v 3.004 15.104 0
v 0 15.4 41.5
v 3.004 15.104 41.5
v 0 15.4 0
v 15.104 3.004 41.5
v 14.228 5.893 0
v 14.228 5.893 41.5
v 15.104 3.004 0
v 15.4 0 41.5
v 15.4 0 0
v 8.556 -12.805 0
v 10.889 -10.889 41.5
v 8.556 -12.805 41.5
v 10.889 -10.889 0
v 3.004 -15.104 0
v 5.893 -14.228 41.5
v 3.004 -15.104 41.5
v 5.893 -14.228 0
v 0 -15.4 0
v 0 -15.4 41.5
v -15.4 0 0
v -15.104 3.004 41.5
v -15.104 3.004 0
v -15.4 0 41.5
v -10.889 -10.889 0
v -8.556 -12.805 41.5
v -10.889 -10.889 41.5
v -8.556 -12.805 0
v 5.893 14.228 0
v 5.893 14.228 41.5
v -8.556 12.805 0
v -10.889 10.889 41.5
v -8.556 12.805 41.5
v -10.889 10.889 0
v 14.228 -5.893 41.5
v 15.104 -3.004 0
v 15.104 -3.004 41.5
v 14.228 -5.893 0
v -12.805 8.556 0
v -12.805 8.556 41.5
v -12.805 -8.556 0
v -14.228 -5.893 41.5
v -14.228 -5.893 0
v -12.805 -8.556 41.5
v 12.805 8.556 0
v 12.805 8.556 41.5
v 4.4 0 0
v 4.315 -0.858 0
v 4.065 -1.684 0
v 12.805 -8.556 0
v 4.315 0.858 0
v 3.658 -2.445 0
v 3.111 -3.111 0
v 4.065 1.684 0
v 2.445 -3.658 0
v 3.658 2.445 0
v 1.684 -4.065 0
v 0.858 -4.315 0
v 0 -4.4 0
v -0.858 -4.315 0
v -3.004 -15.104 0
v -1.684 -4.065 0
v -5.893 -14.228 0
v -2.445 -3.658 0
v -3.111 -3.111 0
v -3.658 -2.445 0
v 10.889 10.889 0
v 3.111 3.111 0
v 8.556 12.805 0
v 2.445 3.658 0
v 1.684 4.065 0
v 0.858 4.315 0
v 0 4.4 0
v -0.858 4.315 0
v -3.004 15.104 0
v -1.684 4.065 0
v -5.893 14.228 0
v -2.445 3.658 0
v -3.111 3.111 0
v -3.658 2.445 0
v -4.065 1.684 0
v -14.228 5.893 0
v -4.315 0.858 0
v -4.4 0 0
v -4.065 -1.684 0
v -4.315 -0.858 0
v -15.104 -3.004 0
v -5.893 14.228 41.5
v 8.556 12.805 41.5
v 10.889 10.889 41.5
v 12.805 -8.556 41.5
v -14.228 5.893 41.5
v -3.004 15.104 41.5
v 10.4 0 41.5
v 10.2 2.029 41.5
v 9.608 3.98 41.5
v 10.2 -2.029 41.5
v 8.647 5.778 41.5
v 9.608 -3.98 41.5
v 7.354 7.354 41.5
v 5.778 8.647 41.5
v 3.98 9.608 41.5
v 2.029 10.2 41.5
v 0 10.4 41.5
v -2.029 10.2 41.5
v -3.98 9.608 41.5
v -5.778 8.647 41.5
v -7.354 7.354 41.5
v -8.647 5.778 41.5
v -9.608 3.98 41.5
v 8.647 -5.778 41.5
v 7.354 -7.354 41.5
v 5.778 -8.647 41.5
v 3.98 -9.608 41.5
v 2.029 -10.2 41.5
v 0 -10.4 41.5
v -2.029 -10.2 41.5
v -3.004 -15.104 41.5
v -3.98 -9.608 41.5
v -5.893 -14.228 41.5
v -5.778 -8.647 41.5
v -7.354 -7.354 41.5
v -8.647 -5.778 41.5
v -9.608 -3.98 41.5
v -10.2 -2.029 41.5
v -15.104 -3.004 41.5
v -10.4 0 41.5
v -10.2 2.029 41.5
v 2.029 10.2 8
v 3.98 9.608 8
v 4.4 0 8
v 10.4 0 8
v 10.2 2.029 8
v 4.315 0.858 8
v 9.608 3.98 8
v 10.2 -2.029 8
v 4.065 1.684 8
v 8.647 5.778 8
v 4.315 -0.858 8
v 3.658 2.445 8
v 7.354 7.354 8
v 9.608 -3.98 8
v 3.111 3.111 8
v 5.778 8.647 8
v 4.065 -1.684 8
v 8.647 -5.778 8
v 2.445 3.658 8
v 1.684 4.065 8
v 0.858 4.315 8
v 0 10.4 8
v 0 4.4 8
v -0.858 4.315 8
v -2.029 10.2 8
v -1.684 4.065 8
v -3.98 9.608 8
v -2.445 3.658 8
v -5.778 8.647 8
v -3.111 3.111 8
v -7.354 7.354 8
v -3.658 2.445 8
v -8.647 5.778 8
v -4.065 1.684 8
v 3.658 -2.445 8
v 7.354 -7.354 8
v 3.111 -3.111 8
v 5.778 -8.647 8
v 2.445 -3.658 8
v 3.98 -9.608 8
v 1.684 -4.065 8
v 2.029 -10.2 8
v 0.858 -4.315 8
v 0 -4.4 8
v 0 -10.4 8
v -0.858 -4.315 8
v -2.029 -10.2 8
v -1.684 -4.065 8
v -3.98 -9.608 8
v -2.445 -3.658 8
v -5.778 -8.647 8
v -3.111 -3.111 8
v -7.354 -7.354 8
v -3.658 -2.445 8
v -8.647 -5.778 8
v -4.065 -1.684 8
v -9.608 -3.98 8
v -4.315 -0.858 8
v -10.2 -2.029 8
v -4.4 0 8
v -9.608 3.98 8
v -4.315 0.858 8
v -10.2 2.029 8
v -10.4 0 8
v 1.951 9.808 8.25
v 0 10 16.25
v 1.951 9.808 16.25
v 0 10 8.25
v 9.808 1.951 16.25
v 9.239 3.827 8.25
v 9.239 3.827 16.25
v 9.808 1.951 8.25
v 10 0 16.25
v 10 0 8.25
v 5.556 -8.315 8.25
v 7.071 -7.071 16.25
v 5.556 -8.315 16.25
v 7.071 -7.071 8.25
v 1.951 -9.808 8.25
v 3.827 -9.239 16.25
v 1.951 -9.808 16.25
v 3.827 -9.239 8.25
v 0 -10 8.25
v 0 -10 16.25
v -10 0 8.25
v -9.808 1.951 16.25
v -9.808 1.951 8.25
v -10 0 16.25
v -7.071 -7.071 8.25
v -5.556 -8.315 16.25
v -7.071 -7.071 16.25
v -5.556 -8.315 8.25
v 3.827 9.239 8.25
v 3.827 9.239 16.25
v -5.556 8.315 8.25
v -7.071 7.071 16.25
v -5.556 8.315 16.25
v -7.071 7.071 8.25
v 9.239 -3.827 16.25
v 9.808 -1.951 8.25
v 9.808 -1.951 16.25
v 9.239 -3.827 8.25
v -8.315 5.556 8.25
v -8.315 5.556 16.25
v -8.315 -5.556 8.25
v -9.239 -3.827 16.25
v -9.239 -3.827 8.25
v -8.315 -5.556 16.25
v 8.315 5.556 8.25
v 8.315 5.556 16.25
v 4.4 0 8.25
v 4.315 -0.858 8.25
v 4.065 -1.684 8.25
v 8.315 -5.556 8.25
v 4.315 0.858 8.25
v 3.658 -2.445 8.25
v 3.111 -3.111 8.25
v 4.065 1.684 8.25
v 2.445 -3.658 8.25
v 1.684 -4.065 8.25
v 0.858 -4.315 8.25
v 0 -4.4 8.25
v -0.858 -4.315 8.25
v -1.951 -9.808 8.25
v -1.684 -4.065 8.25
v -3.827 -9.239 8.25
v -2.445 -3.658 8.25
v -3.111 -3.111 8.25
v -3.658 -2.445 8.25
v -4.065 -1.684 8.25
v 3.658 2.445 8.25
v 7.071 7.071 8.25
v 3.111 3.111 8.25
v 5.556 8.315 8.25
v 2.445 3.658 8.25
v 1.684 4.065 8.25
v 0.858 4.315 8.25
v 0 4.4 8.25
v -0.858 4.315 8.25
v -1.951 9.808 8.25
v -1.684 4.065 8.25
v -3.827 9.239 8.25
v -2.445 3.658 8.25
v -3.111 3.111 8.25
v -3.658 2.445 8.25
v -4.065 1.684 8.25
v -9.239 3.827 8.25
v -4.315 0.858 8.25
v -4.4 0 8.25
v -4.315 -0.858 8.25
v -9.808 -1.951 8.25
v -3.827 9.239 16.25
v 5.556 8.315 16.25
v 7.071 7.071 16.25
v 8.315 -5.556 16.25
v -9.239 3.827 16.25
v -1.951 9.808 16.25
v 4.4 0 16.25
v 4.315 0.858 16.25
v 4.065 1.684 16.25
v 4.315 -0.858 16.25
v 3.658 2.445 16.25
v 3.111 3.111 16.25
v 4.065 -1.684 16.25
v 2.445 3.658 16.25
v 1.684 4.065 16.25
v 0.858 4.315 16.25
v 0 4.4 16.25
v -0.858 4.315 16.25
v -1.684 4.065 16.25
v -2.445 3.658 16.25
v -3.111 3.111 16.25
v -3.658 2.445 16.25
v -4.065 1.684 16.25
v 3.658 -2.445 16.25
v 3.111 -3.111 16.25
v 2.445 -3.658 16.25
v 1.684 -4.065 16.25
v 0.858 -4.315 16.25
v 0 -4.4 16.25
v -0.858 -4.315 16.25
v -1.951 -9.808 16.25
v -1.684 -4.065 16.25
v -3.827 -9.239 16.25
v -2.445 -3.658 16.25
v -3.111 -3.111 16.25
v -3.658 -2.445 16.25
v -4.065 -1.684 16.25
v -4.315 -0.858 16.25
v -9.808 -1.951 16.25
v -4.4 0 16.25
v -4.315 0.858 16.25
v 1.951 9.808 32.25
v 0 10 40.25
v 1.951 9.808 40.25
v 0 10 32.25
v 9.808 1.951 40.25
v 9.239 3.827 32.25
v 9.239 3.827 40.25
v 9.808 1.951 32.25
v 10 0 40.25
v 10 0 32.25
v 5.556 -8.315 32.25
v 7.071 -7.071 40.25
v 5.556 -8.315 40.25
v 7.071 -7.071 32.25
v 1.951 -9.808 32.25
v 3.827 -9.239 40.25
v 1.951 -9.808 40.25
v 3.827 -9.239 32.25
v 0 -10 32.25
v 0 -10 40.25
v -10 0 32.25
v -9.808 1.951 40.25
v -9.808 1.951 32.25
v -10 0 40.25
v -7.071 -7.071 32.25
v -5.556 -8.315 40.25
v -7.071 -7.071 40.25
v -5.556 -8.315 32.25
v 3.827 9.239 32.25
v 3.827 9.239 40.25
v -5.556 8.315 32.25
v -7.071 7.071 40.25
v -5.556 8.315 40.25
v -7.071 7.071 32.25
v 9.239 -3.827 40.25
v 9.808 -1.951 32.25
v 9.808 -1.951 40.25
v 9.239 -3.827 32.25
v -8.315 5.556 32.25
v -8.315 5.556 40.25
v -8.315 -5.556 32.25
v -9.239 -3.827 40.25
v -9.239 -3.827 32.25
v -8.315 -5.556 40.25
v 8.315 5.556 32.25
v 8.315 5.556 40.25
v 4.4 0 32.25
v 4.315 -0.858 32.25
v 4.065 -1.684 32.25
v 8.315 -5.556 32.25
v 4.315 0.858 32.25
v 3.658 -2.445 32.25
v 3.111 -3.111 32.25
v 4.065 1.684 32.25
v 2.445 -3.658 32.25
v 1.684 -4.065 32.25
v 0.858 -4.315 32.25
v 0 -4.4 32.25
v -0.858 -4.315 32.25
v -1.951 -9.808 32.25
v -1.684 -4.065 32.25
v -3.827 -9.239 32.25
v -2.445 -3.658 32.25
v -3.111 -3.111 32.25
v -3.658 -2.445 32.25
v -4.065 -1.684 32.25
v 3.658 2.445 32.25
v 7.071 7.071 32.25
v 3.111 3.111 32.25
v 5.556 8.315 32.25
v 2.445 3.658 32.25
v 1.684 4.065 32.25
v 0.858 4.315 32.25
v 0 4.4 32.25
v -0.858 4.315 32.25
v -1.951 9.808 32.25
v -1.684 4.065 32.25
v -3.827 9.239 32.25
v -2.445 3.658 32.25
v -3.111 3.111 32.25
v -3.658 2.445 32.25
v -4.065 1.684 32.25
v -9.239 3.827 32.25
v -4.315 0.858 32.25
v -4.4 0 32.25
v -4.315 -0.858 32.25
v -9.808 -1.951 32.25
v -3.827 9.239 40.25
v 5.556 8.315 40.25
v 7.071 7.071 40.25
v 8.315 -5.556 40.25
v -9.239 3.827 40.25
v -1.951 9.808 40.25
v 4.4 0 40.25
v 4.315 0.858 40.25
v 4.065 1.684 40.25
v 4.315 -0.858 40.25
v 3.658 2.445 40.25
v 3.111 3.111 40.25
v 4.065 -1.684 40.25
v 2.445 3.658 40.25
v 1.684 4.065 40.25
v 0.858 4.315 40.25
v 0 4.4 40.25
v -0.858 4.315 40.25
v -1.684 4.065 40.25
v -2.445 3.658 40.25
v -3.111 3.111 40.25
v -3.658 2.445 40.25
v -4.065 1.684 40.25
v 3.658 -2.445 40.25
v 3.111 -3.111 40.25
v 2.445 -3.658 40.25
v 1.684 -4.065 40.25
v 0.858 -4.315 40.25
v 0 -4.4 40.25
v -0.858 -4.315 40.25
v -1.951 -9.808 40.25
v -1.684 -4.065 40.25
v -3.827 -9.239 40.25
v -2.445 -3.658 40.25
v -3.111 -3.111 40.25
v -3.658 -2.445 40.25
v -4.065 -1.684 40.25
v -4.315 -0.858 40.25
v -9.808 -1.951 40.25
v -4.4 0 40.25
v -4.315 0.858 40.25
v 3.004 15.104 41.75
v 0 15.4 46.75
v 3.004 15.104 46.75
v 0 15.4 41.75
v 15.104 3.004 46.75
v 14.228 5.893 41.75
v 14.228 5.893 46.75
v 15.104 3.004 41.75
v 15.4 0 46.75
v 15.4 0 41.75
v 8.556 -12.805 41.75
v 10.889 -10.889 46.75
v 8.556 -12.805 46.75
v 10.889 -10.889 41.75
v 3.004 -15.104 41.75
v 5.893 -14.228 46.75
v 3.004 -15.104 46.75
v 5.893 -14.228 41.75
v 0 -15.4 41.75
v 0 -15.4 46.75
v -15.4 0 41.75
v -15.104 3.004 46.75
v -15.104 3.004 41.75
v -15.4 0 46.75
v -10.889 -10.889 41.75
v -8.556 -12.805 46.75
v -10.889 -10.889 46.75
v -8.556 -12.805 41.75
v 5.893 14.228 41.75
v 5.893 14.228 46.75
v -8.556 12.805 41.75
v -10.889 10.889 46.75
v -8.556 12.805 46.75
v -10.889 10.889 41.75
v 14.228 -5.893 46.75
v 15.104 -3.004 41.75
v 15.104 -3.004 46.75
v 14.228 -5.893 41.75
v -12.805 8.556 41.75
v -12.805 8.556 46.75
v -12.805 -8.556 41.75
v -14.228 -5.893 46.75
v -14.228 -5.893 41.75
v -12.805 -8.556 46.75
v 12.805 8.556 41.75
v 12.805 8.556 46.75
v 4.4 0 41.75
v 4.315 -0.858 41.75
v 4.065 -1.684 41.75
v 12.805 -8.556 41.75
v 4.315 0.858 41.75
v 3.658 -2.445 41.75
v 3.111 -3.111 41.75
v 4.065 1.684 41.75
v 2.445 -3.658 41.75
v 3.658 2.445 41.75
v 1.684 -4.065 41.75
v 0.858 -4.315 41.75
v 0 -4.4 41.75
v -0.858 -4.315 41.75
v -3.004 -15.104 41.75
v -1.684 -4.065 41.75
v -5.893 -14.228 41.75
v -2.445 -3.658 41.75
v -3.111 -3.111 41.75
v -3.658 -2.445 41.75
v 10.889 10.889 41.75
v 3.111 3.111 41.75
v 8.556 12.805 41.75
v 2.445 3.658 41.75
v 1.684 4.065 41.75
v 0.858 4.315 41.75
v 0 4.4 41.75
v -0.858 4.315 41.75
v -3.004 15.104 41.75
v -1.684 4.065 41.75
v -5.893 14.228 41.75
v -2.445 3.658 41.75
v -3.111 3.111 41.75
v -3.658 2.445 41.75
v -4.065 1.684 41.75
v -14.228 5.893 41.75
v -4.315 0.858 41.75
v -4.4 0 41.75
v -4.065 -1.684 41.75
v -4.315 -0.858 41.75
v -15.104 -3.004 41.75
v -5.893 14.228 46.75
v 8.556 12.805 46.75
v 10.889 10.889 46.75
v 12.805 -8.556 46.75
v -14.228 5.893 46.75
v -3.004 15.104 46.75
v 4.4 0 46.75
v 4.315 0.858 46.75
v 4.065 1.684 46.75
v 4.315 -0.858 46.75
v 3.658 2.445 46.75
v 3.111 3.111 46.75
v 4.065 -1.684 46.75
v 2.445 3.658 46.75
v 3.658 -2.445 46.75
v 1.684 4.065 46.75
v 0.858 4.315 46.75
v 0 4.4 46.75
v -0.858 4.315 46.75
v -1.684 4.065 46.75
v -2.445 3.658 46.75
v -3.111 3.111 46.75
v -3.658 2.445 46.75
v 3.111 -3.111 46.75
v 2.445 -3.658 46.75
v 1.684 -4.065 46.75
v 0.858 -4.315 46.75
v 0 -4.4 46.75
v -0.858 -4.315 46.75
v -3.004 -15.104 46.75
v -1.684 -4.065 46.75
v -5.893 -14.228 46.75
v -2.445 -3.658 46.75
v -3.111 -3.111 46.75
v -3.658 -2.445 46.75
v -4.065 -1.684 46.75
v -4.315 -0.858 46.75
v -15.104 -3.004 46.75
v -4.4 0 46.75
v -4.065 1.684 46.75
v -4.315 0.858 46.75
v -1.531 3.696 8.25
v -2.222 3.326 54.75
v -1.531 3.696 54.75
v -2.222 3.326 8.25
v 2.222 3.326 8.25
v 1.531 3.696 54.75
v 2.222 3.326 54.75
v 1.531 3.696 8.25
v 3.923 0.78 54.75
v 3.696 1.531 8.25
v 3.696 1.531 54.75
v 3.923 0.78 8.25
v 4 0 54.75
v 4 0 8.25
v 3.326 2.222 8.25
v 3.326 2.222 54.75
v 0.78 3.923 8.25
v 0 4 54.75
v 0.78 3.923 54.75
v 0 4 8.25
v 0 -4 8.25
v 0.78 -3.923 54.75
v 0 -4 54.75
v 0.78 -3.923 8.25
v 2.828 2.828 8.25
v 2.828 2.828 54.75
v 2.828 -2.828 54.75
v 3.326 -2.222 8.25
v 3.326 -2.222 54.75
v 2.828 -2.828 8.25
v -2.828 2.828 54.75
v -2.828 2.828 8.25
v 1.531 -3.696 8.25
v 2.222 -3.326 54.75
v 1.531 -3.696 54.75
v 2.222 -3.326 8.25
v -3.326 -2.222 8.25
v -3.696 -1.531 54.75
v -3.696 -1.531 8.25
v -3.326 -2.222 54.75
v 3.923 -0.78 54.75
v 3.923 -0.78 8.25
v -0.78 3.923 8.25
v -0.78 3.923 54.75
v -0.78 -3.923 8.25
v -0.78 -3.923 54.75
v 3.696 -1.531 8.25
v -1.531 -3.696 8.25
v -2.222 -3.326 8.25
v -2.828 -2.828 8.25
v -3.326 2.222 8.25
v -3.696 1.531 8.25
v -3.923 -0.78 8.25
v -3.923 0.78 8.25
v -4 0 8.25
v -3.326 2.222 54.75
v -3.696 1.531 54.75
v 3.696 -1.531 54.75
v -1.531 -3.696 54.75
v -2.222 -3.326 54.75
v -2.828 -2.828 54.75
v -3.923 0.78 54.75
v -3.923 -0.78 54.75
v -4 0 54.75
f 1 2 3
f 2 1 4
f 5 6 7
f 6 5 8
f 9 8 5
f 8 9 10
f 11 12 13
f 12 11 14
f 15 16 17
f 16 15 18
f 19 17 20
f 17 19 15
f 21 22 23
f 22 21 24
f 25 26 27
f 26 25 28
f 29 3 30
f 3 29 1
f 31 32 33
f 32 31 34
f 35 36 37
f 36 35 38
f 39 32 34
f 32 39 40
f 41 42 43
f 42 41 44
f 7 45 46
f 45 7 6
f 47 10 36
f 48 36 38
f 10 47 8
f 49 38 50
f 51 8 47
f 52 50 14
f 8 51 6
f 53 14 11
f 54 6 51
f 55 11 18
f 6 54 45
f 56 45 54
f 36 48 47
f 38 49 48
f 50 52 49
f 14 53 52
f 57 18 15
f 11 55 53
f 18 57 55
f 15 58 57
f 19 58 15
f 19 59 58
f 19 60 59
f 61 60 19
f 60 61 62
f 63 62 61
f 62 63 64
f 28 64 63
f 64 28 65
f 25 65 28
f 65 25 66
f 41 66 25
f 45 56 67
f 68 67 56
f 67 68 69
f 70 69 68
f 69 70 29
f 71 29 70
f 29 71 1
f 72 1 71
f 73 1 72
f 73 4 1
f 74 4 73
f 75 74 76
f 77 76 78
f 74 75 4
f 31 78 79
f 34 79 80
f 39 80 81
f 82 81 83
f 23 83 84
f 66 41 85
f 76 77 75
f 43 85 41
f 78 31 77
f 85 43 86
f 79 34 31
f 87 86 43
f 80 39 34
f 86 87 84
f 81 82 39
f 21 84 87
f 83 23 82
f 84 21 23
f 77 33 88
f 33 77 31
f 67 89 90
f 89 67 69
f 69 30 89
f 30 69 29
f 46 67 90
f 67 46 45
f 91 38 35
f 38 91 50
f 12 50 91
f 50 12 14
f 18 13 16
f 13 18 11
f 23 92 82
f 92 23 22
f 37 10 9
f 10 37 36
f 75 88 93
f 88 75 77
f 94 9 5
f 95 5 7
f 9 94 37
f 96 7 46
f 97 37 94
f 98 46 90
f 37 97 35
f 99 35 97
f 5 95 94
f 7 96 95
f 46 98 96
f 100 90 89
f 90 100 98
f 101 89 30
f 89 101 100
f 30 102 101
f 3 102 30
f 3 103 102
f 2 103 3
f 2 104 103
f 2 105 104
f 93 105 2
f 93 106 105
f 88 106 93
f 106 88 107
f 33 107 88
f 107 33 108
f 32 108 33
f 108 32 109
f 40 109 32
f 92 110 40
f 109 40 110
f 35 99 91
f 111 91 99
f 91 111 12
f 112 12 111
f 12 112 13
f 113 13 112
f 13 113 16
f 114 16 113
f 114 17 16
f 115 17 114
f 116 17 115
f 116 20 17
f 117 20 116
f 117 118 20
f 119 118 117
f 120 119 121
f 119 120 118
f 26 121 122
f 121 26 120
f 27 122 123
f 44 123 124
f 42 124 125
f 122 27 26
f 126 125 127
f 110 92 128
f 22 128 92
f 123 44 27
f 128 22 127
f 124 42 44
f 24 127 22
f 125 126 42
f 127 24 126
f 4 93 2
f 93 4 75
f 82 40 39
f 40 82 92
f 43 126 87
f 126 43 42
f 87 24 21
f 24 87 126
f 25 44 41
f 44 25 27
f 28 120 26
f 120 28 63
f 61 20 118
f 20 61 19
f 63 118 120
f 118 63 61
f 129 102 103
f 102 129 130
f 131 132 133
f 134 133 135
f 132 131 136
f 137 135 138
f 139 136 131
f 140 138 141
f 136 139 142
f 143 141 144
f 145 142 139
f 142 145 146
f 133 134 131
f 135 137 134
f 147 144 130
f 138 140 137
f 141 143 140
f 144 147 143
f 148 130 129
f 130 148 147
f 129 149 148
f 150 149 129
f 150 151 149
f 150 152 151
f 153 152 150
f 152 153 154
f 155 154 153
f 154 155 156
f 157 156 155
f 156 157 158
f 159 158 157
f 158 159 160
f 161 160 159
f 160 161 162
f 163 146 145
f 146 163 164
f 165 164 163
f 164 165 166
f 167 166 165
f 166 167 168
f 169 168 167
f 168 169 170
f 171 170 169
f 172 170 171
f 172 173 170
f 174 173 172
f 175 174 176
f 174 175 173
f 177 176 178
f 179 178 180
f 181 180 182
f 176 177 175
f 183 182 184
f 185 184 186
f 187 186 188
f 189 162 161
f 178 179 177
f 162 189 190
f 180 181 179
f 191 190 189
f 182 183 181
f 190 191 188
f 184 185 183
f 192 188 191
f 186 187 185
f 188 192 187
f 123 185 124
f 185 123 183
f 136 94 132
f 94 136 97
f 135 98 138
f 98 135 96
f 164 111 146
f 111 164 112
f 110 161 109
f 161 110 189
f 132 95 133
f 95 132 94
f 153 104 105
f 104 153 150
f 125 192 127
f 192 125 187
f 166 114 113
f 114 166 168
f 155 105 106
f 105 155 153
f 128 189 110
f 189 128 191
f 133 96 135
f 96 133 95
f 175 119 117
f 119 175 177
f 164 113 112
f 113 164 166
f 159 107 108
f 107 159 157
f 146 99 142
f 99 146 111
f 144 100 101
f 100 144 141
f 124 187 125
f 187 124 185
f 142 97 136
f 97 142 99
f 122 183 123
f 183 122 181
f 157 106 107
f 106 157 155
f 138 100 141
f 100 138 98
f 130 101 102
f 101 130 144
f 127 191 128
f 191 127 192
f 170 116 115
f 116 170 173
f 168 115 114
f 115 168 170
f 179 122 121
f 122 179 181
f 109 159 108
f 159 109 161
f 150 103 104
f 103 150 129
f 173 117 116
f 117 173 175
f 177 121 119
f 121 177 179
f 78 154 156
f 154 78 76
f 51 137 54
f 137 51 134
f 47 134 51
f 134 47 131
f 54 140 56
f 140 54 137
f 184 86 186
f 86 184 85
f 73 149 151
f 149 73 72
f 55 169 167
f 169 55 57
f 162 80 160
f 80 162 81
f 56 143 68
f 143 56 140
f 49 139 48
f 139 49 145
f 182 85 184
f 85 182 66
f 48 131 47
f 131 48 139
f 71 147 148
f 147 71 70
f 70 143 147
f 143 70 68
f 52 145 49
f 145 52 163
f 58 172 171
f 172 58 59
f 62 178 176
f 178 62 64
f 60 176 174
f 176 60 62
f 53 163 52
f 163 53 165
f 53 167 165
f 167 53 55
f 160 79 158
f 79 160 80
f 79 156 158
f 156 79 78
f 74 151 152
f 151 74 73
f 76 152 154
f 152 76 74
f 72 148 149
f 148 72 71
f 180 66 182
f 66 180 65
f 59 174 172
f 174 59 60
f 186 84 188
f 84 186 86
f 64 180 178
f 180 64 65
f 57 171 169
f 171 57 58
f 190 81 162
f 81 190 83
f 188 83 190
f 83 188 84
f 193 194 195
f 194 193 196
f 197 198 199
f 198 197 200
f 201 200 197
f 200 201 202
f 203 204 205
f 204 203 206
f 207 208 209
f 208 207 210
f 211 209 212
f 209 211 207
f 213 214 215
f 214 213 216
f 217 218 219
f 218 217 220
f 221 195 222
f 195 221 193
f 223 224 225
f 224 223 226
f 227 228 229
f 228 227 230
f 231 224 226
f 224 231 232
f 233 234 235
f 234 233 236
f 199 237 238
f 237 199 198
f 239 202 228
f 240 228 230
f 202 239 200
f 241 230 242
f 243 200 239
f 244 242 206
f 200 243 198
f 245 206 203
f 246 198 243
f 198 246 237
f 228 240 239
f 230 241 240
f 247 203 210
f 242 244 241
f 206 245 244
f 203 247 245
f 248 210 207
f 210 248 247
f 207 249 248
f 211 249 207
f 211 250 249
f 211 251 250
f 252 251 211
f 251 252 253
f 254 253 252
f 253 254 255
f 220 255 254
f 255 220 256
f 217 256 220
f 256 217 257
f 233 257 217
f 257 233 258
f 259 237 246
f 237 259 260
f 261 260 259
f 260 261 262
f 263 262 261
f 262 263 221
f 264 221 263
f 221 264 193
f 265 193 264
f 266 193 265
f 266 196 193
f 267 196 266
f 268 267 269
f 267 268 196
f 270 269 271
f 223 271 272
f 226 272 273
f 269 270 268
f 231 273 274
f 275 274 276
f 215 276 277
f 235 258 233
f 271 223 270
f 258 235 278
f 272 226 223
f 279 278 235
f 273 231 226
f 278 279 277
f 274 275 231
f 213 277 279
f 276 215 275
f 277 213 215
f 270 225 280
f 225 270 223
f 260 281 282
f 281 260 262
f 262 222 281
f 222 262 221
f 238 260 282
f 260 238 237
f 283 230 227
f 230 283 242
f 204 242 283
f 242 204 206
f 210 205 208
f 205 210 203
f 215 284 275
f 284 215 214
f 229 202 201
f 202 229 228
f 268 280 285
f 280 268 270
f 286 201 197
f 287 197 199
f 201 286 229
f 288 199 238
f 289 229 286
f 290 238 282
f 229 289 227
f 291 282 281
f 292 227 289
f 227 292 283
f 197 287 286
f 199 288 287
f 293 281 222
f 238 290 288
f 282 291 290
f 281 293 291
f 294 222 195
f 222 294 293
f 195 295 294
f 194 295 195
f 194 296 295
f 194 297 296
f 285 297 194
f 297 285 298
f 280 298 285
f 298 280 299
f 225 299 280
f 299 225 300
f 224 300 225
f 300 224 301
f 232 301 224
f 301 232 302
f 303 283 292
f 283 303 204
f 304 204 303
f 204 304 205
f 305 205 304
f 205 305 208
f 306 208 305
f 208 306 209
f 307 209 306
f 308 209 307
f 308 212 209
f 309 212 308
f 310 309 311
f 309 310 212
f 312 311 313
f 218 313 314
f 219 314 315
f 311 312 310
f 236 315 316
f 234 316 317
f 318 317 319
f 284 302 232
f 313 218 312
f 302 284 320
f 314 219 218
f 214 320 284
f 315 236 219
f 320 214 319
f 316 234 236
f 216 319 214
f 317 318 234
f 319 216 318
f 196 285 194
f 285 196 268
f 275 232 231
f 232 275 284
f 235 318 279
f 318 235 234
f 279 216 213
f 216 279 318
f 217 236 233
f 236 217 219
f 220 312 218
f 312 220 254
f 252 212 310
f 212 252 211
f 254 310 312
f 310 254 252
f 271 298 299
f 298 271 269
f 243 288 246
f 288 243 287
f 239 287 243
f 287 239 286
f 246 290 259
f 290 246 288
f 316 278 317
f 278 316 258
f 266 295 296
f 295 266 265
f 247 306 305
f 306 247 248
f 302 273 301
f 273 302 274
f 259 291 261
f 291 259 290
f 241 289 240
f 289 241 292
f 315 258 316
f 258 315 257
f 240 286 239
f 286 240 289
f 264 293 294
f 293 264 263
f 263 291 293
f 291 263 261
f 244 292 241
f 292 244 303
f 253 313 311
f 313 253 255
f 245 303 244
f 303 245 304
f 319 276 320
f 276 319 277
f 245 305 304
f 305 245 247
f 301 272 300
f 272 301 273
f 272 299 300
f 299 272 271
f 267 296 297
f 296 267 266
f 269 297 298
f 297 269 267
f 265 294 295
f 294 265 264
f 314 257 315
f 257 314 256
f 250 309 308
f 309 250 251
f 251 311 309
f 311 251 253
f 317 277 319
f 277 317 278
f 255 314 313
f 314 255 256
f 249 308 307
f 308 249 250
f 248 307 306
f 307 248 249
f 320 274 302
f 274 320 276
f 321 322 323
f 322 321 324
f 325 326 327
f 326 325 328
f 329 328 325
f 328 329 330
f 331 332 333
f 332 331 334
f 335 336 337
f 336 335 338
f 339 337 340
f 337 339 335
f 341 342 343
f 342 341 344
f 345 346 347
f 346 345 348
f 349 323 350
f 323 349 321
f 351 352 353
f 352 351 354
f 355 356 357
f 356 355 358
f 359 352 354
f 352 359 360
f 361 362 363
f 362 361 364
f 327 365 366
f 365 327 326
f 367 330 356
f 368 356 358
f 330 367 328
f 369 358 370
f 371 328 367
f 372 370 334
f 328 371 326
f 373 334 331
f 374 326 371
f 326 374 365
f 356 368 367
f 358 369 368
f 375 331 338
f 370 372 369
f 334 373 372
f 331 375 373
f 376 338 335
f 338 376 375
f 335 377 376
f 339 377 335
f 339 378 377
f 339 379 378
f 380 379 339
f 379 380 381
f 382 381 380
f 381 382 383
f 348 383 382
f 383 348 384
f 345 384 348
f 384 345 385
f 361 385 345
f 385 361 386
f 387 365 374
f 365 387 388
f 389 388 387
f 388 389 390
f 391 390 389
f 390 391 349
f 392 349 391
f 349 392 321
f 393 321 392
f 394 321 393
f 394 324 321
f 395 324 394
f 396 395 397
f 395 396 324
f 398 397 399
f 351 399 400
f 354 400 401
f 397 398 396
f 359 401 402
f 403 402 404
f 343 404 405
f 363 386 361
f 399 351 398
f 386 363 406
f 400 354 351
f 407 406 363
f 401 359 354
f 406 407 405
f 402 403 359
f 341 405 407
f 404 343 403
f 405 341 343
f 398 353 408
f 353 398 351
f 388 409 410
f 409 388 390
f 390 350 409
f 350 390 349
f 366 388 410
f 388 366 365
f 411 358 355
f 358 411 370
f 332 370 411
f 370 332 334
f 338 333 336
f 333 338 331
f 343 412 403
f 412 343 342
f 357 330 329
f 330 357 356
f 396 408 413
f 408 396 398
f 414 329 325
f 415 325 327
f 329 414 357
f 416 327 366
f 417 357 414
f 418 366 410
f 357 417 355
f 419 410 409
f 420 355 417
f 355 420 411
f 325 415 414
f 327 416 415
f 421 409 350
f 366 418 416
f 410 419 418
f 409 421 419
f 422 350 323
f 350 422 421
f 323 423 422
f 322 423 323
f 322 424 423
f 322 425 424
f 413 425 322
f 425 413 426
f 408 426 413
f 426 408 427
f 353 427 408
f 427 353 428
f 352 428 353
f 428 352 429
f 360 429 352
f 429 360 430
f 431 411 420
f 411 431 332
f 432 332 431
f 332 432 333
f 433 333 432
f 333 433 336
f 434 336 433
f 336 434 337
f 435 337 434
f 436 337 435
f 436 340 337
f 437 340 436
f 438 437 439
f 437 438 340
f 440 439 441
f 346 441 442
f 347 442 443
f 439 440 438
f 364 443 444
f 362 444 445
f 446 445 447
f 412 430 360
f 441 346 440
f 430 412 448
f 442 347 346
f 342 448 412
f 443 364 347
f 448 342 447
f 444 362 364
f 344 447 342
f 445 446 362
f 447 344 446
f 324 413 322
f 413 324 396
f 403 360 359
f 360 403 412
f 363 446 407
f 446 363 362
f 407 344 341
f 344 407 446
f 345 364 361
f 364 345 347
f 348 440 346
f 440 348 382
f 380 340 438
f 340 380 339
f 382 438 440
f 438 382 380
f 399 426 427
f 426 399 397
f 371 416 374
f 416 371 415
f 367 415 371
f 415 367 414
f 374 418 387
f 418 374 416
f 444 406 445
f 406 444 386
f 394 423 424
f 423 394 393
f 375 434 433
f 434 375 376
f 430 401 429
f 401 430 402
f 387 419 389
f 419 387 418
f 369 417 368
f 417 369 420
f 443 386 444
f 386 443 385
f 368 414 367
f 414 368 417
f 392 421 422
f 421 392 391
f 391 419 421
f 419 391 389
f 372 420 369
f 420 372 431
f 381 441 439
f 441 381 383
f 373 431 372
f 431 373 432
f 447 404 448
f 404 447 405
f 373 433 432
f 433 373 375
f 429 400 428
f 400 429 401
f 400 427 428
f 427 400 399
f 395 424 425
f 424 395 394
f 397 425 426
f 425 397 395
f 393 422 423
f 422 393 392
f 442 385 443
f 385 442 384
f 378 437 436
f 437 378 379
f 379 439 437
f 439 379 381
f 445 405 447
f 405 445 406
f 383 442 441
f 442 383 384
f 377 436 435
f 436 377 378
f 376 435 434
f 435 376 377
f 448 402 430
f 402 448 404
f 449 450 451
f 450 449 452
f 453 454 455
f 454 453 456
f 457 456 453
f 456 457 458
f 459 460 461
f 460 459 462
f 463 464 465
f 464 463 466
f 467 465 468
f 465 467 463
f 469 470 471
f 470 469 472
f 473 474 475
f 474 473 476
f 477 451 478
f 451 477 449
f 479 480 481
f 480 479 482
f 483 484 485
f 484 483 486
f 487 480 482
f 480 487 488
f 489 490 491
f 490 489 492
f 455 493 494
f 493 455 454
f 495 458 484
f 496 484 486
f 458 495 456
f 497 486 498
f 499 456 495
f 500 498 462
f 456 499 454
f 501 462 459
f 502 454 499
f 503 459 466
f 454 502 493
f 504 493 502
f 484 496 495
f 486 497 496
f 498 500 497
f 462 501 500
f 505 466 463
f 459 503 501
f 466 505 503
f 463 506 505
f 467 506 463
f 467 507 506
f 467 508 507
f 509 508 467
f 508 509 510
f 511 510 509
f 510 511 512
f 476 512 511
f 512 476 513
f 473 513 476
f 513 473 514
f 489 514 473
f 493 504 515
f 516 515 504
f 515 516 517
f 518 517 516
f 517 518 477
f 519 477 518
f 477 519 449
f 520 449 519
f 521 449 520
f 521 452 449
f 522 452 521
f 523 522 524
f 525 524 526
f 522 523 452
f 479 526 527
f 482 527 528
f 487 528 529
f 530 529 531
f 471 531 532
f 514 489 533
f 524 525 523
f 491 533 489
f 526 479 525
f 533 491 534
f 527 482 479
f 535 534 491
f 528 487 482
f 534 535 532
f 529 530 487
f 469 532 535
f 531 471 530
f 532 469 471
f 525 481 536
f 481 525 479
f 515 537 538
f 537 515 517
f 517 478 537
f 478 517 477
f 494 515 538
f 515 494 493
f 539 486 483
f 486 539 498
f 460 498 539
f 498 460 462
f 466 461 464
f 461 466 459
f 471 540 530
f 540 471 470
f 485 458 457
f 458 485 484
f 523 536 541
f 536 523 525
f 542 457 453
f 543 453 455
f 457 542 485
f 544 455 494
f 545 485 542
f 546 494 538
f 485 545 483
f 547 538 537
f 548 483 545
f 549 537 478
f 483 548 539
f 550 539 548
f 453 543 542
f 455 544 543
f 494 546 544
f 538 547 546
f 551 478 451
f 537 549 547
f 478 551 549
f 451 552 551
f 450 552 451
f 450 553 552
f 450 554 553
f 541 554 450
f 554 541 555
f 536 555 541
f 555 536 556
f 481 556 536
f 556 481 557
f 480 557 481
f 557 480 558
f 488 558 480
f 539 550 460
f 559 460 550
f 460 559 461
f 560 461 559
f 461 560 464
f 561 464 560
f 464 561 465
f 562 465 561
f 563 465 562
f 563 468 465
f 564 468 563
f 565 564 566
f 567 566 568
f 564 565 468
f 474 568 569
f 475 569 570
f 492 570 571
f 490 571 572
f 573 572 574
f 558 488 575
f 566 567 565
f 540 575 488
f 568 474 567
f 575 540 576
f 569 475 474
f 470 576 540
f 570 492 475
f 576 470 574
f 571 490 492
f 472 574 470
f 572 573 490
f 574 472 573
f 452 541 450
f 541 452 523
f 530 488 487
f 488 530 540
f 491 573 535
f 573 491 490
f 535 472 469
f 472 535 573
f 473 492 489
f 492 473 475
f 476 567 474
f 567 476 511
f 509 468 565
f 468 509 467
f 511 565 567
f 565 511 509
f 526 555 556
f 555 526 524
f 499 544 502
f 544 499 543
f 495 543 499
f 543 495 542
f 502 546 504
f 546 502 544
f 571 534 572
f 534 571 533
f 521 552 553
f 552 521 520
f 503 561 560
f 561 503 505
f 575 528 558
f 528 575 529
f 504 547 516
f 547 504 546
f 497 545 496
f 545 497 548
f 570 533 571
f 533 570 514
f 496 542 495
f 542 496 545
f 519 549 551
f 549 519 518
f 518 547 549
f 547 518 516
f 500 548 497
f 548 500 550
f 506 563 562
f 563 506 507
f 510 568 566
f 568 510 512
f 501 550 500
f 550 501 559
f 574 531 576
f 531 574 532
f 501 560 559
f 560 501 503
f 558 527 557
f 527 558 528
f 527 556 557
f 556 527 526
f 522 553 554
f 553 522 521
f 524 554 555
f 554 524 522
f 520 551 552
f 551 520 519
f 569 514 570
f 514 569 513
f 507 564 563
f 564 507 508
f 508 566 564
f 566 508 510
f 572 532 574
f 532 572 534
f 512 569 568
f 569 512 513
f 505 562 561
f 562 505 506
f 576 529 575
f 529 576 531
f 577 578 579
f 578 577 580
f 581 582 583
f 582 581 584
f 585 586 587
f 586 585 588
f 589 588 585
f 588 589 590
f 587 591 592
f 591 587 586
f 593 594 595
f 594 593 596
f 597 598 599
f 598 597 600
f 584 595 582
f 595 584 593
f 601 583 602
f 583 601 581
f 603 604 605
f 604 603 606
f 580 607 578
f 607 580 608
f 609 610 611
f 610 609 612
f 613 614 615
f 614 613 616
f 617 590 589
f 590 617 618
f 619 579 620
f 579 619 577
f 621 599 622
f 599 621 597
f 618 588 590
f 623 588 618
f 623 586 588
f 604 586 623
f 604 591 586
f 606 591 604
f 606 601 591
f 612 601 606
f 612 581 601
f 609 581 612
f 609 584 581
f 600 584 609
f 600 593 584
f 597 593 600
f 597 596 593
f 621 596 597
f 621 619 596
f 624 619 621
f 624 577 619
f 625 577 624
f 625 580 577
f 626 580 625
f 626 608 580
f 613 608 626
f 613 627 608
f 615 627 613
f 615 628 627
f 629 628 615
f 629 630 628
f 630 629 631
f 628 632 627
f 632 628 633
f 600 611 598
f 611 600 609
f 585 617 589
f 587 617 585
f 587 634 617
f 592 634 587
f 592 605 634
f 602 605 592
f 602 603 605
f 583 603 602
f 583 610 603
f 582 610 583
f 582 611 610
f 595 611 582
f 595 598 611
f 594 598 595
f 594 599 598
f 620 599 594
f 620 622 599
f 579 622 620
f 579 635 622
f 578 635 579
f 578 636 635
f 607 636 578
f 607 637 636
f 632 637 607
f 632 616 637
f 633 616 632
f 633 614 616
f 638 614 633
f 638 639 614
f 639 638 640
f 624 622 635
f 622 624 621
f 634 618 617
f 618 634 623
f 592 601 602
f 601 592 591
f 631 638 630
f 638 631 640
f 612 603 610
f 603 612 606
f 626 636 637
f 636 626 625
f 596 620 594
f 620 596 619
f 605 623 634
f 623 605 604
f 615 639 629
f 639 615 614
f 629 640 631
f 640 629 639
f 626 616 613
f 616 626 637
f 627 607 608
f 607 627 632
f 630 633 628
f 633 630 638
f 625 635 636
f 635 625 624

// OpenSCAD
$fn = 32;

// ------------------------------------------------------------------------
// Shaft station: cup d30.8 x 41.5 mm, shaft d8
// Every part is its own module, assembly() places every instance.
// ------------------------------------------------------------------------

// --- part 1 ---
module housing_cup() {
  difference() {
    cylinder(h = 41.5, d = 30.8);
    translate([0, 0, 8]) cylinder(h = 34.5, d = 20.8);
    translate([0, 0, -1]) cylinder(h = 10, d = 8.8);
  }
}

// --- part 2 ---
module bearing_lower() {
  difference() {
      translate([0, 0, 0]) cylinder(h = 8, d = 20);
      translate([0, 0, -1]) cylinder(h = 10, d = 8.8);
    }
}

// --- part 3 ---
module bearing_upper() {
  difference() {
      translate([0, 0, 0]) cylinder(h = 8, d = 20);
      translate([0, 0, -1]) cylinder(h = 10, d = 8.8);
    }
}

// --- part 4 ---
module station_shaft() {
  translate([0, 0, -23.25]) cylinder(h = 46.5, d = 8);
}

// --- part 5 ---
module station_cover() {
  difference() {
    cylinder(h = 5, d = 30.8);
    translate([0, 0, -1]) cylinder(h = 7, d = 8.8);
  }
}

// --- assembly ---
module assembly() {
  color([0.80, 0.24, 0.20]) translate([0, 0, 0]) rotate([0, 0, 0]) housing_cup();
  color([0.20, 0.45, 0.75]) translate([0, 0, 8.25]) rotate([0, 0, 0]) bearing_lower();
  color([0.25, 0.62, 0.32]) translate([0, 0, 32.25]) rotate([0, 0, 0]) bearing_upper();
  color([0.92, 0.70, 0.18]) translate([0, 0, 31.5]) rotate([0, 0, 0]) station_shaft();
  color([0.58, 0.35, 0.70]) translate([0, 0, 41.75]) rotate([0, 0, 0]) station_cover();
}

assembly();
